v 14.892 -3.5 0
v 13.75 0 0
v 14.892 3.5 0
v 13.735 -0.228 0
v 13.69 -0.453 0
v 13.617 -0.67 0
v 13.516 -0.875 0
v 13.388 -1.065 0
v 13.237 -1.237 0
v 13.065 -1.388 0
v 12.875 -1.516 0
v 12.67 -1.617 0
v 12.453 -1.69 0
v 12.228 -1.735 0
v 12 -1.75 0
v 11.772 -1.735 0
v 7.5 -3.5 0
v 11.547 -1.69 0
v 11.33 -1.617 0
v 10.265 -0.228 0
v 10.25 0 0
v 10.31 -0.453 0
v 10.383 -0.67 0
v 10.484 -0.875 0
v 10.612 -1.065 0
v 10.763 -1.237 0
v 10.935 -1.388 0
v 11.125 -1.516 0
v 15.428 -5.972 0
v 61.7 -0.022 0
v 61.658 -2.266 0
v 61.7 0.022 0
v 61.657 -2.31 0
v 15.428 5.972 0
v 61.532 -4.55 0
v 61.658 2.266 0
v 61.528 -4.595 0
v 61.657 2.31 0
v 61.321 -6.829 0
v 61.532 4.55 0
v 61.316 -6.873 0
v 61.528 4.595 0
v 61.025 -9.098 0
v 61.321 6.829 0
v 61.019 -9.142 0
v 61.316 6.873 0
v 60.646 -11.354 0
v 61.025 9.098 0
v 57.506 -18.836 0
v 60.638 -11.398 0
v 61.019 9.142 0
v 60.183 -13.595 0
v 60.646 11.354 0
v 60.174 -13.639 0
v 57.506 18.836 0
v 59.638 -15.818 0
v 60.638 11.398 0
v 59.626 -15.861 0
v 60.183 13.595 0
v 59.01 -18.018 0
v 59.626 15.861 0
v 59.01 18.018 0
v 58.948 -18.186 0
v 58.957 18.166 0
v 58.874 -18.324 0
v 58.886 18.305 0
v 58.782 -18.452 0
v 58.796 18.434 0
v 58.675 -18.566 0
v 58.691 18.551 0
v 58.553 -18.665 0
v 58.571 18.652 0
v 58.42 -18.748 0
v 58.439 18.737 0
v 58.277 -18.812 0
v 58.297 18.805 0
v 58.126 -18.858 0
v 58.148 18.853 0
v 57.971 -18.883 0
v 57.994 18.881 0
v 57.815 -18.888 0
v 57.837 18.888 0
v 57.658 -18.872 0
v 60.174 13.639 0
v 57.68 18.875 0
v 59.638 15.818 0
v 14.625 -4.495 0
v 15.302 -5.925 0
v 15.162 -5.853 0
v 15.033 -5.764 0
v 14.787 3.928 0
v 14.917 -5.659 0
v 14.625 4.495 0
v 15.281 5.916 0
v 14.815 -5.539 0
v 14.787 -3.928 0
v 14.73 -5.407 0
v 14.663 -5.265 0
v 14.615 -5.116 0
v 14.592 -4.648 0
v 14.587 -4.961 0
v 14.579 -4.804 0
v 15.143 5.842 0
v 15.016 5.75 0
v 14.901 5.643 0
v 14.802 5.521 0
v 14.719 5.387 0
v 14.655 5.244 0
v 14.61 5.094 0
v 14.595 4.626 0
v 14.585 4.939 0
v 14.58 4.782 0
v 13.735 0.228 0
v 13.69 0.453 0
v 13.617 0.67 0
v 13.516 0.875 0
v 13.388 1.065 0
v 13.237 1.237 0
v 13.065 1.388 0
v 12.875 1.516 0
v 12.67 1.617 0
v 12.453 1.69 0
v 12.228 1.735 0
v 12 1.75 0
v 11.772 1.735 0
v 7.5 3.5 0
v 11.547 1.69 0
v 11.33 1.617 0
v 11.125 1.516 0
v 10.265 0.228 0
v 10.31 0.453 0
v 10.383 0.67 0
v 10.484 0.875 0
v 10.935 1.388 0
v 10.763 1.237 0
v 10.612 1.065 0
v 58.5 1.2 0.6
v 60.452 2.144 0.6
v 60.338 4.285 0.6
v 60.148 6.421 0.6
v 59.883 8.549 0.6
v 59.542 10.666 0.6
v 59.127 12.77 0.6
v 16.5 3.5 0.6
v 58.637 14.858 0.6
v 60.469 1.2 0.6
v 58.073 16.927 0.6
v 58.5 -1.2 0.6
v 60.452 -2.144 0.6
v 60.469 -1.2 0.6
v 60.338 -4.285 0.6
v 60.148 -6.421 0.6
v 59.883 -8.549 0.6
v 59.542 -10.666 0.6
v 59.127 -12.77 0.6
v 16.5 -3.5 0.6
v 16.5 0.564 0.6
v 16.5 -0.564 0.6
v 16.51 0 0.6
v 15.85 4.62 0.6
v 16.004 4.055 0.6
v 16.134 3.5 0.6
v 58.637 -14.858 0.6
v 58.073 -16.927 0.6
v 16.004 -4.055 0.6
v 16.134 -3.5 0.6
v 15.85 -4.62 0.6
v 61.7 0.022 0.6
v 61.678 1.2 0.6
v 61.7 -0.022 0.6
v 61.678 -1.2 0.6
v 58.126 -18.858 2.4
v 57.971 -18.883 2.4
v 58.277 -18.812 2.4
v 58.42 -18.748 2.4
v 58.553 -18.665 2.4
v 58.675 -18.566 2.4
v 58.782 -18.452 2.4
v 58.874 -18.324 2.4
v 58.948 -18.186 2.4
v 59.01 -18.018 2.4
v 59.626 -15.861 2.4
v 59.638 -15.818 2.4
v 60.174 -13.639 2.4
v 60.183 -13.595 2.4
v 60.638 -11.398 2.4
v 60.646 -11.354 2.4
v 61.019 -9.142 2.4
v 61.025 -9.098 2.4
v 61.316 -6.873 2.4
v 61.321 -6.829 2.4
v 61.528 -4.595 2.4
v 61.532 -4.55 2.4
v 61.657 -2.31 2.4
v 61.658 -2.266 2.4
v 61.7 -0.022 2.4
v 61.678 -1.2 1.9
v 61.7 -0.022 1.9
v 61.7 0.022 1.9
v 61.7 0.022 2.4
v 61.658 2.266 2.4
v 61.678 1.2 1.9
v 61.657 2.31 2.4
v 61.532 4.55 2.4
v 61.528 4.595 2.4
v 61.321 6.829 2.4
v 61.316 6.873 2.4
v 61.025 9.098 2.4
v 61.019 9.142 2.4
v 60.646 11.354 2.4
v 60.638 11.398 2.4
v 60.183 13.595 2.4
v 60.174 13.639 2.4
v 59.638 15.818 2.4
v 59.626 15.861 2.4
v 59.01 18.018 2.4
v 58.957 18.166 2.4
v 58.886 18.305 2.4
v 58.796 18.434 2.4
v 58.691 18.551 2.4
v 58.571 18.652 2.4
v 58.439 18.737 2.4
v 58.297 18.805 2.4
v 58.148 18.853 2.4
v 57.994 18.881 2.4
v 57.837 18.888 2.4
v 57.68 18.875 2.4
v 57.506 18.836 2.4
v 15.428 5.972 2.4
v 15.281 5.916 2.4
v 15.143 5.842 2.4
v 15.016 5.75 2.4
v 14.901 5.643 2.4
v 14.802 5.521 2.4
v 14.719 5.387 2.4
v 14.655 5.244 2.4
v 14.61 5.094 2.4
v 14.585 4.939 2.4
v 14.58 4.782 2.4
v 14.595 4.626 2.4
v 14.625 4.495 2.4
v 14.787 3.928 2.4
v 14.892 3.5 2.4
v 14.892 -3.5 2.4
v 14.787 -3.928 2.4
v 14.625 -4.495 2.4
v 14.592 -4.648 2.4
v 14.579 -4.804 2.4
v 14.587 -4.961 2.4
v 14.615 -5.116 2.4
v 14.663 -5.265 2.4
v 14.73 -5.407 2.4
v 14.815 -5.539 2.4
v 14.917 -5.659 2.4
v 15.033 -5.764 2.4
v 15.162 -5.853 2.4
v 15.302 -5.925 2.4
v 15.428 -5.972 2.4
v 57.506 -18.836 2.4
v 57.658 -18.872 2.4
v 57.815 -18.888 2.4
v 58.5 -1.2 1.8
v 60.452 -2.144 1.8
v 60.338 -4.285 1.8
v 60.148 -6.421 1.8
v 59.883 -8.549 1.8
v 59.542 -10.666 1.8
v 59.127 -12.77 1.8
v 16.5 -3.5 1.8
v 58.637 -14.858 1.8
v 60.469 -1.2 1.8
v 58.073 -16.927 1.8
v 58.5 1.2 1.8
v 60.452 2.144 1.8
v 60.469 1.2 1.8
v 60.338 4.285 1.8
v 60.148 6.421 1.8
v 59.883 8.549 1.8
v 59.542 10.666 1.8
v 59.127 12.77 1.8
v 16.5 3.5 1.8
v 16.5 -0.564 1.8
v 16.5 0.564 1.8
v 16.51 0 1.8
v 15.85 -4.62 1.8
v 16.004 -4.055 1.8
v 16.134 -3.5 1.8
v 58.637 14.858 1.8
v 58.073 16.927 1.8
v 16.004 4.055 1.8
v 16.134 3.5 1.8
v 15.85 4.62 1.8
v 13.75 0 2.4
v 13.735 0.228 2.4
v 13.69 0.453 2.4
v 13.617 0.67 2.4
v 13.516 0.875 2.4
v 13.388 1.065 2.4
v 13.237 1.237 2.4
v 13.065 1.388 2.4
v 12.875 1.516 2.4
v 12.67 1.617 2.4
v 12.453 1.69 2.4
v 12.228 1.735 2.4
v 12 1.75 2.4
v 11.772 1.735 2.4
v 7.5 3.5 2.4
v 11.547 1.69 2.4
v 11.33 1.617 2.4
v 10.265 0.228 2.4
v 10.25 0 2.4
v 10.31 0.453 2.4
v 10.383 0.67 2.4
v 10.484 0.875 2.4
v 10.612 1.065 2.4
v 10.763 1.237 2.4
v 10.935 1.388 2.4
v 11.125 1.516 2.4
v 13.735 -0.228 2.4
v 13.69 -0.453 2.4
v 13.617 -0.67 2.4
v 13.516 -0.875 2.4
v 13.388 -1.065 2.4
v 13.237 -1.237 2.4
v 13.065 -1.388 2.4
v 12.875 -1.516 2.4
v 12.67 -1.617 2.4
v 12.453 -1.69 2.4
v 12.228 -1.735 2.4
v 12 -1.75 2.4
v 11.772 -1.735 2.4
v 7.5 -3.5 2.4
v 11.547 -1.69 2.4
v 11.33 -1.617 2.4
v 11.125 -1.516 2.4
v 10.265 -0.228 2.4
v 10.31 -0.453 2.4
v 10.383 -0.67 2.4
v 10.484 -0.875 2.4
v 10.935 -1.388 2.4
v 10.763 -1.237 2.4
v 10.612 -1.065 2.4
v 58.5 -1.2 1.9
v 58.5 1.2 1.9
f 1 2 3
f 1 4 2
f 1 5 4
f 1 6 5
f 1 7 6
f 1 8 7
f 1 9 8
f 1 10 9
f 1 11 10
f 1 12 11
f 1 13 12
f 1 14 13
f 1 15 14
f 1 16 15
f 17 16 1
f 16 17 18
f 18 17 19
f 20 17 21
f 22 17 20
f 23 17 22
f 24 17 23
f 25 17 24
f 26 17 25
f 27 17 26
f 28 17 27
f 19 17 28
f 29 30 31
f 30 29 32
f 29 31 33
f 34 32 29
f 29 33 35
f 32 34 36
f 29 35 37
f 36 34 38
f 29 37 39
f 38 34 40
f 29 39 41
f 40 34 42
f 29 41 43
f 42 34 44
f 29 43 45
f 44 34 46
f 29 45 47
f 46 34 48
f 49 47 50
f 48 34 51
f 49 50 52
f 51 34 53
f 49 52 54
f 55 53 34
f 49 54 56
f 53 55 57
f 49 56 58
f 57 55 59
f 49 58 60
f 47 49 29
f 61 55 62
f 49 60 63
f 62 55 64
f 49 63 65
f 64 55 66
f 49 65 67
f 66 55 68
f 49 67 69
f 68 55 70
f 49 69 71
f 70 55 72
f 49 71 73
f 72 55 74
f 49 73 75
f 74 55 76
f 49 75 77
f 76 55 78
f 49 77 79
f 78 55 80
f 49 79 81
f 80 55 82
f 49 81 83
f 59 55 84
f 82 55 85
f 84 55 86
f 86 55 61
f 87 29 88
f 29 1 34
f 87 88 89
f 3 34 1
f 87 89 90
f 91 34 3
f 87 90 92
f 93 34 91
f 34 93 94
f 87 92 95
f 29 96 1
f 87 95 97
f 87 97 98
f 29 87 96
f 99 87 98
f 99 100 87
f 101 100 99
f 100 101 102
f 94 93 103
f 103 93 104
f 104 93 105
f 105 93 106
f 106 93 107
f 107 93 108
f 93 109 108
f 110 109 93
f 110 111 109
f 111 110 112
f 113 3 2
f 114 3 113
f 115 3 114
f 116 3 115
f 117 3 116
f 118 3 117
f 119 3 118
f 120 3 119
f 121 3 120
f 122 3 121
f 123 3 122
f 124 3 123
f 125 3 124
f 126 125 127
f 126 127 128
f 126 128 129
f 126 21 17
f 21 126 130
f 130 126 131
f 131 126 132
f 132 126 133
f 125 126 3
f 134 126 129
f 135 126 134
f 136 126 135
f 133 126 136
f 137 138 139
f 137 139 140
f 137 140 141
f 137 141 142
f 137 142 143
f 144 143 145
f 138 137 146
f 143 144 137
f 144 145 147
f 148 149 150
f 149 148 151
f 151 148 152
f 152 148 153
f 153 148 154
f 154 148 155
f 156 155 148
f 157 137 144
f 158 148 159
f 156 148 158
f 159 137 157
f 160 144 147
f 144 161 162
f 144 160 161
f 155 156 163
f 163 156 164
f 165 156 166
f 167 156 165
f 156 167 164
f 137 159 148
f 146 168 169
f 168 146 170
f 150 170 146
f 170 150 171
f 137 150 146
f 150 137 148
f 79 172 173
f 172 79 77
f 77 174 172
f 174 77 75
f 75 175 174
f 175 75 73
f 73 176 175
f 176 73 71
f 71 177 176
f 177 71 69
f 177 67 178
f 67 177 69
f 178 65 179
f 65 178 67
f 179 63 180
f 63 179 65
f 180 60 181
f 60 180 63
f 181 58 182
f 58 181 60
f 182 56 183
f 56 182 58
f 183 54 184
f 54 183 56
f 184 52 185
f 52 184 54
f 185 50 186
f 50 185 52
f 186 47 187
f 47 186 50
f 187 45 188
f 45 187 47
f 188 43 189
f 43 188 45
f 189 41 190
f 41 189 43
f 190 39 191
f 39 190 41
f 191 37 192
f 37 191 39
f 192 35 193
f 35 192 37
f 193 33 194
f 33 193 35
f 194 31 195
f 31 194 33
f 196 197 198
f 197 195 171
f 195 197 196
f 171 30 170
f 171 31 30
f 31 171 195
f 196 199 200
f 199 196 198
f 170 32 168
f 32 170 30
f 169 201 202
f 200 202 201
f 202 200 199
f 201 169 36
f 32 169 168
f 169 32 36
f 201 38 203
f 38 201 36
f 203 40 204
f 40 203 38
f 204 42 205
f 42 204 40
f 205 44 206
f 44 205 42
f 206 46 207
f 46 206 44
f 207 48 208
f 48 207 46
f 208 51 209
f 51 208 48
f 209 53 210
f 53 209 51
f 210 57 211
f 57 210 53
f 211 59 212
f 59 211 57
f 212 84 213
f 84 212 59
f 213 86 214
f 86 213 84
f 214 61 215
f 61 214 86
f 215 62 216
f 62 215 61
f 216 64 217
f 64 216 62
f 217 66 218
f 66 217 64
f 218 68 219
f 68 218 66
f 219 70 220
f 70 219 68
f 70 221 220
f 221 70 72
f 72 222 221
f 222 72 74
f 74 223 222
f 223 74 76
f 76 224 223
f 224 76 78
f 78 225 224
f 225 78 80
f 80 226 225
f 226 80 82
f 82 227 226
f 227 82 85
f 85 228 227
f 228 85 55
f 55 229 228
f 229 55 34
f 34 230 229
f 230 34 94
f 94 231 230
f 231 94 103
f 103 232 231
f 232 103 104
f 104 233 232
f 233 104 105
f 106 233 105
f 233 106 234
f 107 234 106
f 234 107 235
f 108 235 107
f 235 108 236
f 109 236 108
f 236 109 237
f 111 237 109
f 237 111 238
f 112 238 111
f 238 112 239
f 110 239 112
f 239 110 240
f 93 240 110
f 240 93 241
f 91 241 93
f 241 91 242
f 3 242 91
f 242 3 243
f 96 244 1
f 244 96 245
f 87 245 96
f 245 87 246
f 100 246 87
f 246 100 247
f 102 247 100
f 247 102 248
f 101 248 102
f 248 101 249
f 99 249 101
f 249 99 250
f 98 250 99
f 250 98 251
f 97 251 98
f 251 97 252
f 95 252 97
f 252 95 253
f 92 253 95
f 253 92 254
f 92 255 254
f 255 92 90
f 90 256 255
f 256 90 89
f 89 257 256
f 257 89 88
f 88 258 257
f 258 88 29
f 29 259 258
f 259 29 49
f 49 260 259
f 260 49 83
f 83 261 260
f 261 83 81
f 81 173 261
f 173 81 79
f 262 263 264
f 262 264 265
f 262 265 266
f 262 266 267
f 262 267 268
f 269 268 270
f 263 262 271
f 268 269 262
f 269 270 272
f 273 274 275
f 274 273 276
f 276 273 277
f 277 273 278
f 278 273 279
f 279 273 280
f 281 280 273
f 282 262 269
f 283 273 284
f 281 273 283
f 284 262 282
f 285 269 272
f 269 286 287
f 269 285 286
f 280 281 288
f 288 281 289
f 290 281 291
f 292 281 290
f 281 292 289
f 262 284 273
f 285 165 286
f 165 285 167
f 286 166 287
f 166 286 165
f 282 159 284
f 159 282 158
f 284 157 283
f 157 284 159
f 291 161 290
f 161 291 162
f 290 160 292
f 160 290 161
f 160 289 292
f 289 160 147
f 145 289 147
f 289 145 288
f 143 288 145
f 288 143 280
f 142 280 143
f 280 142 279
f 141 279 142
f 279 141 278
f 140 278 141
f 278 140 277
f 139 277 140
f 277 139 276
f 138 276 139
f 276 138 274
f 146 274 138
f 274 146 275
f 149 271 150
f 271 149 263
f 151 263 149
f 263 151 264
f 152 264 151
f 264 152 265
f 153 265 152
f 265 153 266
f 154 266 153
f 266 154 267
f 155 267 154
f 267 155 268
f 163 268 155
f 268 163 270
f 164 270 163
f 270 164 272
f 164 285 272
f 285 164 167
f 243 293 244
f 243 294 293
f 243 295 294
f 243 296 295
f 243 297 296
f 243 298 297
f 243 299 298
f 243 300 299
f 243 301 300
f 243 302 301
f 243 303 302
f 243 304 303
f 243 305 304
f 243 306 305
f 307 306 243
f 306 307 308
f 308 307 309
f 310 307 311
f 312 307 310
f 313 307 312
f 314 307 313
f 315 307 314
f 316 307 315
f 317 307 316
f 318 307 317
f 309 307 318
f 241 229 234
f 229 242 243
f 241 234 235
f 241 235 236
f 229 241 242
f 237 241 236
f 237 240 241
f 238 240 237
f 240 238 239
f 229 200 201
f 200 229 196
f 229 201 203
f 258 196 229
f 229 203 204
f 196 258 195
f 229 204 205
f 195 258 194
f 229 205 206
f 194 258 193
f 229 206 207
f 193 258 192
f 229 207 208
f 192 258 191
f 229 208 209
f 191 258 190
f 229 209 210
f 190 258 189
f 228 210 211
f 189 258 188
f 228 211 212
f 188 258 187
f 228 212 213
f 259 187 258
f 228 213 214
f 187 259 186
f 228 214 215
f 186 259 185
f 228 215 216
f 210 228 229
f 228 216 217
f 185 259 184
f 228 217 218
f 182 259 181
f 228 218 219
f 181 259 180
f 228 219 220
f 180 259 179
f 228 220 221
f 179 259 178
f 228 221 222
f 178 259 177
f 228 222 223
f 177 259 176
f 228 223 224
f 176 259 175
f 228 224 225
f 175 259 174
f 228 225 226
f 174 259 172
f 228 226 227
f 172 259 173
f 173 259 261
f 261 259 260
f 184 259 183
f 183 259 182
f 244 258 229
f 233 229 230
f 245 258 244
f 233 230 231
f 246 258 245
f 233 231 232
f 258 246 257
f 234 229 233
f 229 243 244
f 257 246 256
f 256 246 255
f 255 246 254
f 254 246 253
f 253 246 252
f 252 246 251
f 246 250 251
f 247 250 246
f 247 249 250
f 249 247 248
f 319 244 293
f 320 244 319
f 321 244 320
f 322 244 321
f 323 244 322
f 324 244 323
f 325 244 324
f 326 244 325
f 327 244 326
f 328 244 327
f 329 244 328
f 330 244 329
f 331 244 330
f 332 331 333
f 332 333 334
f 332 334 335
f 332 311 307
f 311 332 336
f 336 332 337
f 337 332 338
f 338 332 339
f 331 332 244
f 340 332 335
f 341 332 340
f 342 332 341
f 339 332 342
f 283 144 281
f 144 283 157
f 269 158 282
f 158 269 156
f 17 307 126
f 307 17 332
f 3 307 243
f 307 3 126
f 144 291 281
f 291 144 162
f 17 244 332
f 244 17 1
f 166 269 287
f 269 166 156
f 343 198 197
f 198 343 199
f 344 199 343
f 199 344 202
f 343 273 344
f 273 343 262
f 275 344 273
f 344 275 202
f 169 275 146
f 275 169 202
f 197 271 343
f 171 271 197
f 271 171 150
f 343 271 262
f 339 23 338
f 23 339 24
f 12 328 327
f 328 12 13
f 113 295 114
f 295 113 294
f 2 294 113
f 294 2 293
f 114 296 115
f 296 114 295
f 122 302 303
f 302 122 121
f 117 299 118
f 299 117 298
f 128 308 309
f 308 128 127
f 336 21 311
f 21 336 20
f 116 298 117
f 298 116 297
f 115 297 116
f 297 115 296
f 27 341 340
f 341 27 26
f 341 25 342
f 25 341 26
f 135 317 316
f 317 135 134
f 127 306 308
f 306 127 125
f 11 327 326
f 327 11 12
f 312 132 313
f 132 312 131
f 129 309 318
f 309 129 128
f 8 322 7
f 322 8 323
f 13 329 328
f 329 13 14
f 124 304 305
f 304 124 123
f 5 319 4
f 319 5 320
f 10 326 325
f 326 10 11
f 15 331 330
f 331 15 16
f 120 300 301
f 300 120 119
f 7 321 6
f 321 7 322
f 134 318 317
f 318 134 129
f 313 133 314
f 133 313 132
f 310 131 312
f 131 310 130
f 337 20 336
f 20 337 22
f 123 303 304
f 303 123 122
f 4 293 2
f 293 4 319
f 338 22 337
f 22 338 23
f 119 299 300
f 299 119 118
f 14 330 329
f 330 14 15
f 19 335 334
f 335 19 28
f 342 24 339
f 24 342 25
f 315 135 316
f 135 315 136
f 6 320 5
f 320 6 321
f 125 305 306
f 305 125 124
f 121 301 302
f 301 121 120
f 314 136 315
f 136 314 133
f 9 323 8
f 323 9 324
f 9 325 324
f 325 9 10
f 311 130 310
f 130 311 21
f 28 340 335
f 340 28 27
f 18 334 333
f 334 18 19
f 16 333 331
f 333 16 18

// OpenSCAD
// file: parameters.scad
// =============================================================================
// Gen-AX Stacked dual-stator mid-rotor copper-max ultra - WOUND-AWARE (HARD GATE)
// ONE mid dual-face Halbach rotor | TWO wound pancake stators | 18 coils x185 t
// =============================================================================

wire_awg            = 26;
wire_od             = 0.45;
turns               = 185;      // +5 vs Gen-AU 180; 18x185x~0.114 ~ 380 m
fill                = 0.70;
layers_per_face     = 2;
wind_build_axial    = layers_per_face * wire_od * fill;   // 0.63
wind_build_radial   = 3 * wire_od * fill;                 // 0.945

coil_id_r           = 16.5;
coil_od_r           = 60.5;
span_deg            = 34.0;     // 9 stations x 40 deg
former_web          = 1.20;     // print floor LB walls
flange_t            = 0.60;
wall                = 1.2;
slot_w              = 2.4;
mount_hole          = 3.5;
tab_len             = 7.0;

former_bare_h       = former_web + 2 * flange_t;            // 2.40
coil_envelope_h     = former_bare_h + 2 * wind_build_axial; // 3.66

run_clear           = 0.50;
gap_spacer_h        = run_clear + wind_build_axial;         // 1.13
m2m                 = coil_envelope_h + 2 * run_clear;      // 4.66 per gap

coil_stations       = 9;        // per stator; x2 = 18 total
bay_r_in            = coil_id_r - 2.0 - wind_build_radial;
bay_r_out           = coil_od_r + 2.0 + wind_build_radial;
bay_span            = span_deg + 4.0;
bay_offset          = 2.0;
bay_depth           = former_bare_h + wind_build_axial;     // wound sits in bay
stator_back_web     = 2.0;
stator_thick        = bay_depth + stator_back_web;
stator_od           = 156.0;
shaft_clear_stator  = 38.0;
coil_mount_r        = 27.0;

large_pocket_d      = 20.3;
small_pocket_d      = 5.3;
pocket_h            = 5.2;
large_n             = 8;
R_large             = 38.5;     // tighter copper overlap vs AU R=39.0
R_small_inner       = 25.0;
R_small_mid         = 38.5;
R_small_outer       = 55.0;
carrier_od          = 154.0;
mid_carrier_thick   = 12.0;
hub_h               = 10.0;
hub_od              = 30.0;
rotor_b_offset_deg  = 22.5;

shaft_bore          = 8.35;
bearing_d           = 21.85;
bearing_h           = 7.2;
m3_clear            = 3.5;
bolt_r_inner        = 36.0;
bolt_n_inner        = 6;
flange_bolt_r       = 72.0;
flange_bolt_n       = 6;
brace_r             = 68.0;
brace_d             = 4.3;
brace_n             = 4;

spacer_pad_od       = 14.0;
spacer_pad_id       = m3_clear;
endbell_od          = 156.0;
endbell_thick       = 8.0;
endbell_shaft_clear = 10.0;

$fn = 64;
// main file
// Gen-AX pancake former — wind BEFORE assembly
include <parameters.scad>;
$fn = 48;

module sector_2d(r_in, r_out, ang) {
    polygon([
        for (a = [-ang/2 : ang/16 : ang/2]) [r_in*cos(a), r_in*sin(a)],
        for (a = [ang/2 : -ang/16 : -ang/2]) [r_out*cos(a), r_out*sin(a)]
    ]);
}
module flange() {
    linear_extrude(flange_t) offset(r=wall) sector_2d(coil_id_r, coil_od_r, span_deg);
}
difference() {
    union() {
        flange();
        translate([0, 0, flange_t])
            linear_extrude(former_web)
                difference() {
                    offset(r=wall) sector_2d(coil_id_r, coil_od_r, span_deg);
                    sector_2d(coil_id_r + 0.01, coil_od_r - 0.01, span_deg - 1.5);
                }
        translate([0, 0, flange_t + former_web]) flange();
        translate([coil_id_r - tab_len - 2, -3.5, 0])
            cube([tab_len + 2, 7, former_bare_h]);
    }
    translate([coil_od_r - 2, -slot_w/2, flange_t])
        cube([wall + 4, slot_w, former_web + 0.1]);
    translate([coil_id_r - tab_len/2 - 1, 0, -0.1])
        cylinder(d=mount_hole, h=former_bare_h + 1);
}
